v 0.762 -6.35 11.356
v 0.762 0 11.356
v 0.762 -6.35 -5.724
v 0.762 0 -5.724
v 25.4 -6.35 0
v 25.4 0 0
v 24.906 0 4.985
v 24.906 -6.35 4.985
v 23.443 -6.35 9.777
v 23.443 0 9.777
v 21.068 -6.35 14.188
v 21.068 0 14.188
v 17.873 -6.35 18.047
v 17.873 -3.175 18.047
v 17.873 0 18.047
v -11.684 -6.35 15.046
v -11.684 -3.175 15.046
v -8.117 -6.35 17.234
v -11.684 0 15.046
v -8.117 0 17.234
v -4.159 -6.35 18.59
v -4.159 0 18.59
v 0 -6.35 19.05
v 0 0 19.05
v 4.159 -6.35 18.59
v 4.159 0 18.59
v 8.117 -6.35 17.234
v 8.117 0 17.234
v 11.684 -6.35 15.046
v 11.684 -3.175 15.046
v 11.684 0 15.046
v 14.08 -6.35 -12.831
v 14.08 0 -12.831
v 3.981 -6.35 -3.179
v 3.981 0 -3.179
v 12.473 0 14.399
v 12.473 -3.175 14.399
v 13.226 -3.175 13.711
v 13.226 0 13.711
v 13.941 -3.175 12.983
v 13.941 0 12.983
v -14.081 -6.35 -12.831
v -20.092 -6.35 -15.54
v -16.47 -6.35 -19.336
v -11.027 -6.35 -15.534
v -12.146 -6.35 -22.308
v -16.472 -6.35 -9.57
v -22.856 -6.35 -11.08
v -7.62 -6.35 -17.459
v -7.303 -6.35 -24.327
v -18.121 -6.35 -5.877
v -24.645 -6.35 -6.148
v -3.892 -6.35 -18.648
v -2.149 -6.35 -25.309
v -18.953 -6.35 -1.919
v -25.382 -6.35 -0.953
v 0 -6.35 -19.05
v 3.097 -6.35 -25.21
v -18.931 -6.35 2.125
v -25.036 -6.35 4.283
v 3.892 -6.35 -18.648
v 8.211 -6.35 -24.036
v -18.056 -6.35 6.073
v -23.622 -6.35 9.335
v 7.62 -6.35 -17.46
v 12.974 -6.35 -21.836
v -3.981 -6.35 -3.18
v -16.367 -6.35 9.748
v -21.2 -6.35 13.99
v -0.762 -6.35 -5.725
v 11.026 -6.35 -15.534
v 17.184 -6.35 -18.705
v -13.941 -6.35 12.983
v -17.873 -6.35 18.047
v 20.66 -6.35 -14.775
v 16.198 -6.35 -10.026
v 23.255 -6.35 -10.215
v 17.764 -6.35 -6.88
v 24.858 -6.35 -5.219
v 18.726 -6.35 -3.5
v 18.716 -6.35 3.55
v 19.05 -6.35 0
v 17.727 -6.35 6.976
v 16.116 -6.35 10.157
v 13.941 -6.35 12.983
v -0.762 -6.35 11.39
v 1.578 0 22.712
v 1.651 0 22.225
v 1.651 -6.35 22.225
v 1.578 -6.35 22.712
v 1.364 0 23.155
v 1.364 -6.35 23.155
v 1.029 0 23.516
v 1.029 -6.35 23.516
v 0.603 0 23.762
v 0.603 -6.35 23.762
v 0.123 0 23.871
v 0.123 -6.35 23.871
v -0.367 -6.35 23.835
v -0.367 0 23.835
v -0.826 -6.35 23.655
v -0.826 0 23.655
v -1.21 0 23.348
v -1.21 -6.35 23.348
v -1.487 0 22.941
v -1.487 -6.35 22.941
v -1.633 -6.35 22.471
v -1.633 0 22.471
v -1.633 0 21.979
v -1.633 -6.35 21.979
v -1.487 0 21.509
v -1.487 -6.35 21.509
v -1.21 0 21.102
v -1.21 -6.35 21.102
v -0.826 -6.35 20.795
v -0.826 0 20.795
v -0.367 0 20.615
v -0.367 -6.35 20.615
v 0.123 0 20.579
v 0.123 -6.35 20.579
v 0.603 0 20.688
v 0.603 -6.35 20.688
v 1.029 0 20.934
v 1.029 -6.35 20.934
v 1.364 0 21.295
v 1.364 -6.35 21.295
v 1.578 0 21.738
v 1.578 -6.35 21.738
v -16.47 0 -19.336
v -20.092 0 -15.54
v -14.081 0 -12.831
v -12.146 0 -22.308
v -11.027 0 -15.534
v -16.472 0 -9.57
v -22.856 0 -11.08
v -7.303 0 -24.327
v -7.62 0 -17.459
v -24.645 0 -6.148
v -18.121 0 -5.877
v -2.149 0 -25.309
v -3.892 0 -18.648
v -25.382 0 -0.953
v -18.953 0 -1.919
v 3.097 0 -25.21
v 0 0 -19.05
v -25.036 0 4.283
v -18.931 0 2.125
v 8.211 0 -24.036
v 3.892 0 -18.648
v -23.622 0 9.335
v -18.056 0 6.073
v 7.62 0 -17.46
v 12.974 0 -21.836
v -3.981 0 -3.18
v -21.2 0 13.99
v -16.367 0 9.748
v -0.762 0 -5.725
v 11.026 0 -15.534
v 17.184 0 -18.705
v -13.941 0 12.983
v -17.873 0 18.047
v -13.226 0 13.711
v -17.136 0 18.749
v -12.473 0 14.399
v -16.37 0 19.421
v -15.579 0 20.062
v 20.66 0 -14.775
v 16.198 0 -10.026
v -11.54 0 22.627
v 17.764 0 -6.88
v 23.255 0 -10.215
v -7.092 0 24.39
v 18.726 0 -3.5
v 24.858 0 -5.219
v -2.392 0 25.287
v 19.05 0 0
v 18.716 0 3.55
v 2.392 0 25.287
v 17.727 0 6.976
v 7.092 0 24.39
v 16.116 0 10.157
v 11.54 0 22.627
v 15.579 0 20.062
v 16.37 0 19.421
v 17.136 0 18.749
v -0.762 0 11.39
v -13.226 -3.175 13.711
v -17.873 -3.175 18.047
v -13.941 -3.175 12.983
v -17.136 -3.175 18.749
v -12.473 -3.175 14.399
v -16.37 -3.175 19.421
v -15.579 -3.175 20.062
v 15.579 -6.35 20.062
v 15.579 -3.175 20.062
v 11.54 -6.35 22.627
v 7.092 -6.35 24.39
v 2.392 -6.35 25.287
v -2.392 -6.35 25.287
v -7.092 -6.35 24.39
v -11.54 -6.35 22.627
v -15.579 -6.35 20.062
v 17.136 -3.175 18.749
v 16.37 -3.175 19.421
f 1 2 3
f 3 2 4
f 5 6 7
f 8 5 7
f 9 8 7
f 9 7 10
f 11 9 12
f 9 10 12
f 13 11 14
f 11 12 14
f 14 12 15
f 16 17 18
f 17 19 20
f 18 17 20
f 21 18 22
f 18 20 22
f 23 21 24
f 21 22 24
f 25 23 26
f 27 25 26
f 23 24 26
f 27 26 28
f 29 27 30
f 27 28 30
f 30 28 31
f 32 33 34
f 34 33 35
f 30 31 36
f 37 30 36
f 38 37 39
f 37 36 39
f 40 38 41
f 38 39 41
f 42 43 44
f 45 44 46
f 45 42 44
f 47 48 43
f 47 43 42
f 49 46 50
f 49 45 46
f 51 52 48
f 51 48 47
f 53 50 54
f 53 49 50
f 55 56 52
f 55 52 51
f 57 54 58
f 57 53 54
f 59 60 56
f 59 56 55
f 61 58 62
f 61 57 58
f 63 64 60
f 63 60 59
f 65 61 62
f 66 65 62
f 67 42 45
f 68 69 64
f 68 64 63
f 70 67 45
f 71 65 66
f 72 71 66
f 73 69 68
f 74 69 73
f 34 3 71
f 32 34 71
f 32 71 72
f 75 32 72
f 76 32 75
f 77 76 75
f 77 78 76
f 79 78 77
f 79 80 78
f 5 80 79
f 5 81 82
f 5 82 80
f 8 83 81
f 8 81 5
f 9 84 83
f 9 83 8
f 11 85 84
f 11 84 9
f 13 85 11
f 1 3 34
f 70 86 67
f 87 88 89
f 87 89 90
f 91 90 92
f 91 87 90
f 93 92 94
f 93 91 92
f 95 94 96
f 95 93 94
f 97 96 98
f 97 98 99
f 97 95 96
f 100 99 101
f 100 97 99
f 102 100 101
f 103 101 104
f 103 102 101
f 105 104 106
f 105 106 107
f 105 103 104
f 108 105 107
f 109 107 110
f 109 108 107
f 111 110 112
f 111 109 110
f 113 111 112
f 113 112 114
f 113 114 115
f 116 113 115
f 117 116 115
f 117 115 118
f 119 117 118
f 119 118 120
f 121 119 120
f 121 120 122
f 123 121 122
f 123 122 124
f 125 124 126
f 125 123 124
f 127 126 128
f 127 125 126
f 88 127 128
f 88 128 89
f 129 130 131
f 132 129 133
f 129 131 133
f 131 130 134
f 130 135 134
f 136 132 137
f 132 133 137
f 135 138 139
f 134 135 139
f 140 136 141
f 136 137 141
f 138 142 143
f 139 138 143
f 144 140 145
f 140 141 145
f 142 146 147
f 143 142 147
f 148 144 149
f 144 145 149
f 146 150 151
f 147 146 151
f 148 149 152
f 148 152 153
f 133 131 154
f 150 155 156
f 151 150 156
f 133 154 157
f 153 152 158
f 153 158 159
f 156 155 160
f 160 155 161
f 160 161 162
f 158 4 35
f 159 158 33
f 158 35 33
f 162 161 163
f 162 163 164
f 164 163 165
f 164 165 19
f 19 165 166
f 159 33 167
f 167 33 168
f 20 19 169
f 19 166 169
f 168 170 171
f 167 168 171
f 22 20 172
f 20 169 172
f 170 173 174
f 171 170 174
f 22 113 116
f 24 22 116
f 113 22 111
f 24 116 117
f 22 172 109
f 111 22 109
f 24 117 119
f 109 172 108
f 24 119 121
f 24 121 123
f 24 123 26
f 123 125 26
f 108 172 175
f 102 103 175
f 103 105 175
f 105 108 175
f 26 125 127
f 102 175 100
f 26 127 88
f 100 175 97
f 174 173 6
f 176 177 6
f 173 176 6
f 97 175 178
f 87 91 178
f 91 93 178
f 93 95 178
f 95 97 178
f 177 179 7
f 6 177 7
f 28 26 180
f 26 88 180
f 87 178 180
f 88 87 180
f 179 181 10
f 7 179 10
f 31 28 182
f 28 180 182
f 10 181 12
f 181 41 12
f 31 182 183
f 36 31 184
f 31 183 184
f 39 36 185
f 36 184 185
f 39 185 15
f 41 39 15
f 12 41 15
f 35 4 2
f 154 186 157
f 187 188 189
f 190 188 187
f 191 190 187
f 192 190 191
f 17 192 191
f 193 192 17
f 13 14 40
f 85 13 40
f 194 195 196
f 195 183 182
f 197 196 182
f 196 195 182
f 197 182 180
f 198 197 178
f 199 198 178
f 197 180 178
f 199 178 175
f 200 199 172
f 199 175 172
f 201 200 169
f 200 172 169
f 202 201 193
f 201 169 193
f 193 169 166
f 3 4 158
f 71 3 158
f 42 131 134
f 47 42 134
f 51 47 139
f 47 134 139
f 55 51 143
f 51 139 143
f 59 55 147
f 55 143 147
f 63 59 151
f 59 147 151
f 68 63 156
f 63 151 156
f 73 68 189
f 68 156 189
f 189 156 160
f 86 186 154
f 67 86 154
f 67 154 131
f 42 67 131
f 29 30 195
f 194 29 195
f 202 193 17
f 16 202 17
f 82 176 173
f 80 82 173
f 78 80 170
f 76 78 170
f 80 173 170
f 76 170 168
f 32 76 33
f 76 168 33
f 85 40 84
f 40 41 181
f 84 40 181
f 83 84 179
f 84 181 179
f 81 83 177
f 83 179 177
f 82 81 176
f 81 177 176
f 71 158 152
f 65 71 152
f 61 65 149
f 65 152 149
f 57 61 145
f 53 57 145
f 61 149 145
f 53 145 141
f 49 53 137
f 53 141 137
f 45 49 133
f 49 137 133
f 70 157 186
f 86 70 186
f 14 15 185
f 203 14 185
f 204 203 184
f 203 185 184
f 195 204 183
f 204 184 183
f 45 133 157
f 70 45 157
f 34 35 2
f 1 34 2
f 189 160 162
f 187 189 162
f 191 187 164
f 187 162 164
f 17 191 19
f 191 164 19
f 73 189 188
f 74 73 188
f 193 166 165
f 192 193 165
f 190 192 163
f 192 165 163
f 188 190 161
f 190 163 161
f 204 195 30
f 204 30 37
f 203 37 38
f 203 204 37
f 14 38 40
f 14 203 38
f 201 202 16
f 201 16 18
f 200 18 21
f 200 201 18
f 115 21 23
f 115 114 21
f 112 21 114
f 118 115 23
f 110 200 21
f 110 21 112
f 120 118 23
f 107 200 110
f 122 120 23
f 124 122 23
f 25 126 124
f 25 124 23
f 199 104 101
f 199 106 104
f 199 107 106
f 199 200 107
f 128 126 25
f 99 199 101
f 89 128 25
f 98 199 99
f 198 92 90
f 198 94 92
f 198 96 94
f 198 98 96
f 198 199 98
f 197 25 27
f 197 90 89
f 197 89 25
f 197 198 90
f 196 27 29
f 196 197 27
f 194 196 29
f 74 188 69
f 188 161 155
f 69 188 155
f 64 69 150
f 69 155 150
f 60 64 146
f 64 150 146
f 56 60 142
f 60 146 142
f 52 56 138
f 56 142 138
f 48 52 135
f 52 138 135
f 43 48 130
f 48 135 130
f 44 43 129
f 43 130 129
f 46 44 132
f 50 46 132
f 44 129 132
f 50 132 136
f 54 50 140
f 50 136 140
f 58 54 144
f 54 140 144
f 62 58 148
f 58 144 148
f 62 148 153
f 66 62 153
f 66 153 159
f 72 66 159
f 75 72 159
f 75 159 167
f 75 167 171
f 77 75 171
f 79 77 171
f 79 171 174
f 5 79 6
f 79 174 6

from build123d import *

# Parameters (mm, degrees)
F1_DEPTH = 6.35
F0_R     = 1.651
F2_DEPTH = 3.175


with BuildPart() as f1:
    # F0 (on Front) → F1 (new body)
    with BuildSketch(Plane.XZ):
        with BuildLine():
            ThreePointArc((11.0264984463, -15.5344401899), (12.6259487856, -14.2649191117), (14.0803208699, -12.831487217))
            Line((14.0803208699, -12.831487217), (3.9810826848, -3.1792186712))
            Line((3.9810826848, -3.1792186712), (0.762, 11.3559151068))
            Line((0.762, 11.3559151068), (0.762, -5.7242254315))
            Line((0.762, -5.7242254315), (11.0264984463, -15.5344401899))
        make_face()
        with BuildLine():
            Line((-3.9805361158, -3.1797711993), (-14.0807017487, -12.8310692565))
            ThreePointArc((-14.0807017487, -12.8310692565), (-12.6263635982, -14.2645519483), (-11.0269407935, -15.5341261981))
            Line((-11.0269407935, -15.5341261981), (-0.762, -5.725375853))
            Line((-0.762, -5.725375853), (-0.762, 11.3895507529))
            Line((-0.762, 11.3895507529), (-3.9805361158, -3.1797711993))
        make_face()
        with BuildLine():
            ThreePointArc((-17.8734776092, 18.047127144), (-9.7768519659, -23.4429768937), (25.4, 0))
            ThreePointArc((25.4, 0), (23.4429768937, 9.7768519659), (17.8734776092, 18.047127144))
            Line((17.8734776092, 18.047127144), (13.9408592709, 12.9828711304))
            ThreePointArc((13.9408592709, 12.9828711304), (17.7267575872, 6.9759992434), (19.05, 0))
            ThreePointArc((19.05, 0), (17.7641860575, -6.8801303559), (14.0803208699, -12.831487217))
            ThreePointArc((14.0803208699, -12.831487217), (12.6259487856, -14.2649191117), (11.0264984463, -15.5344401899))
            ThreePointArc((11.0264984463, -15.5344401899), (-0.0002712295, -19.0499999981), (-11.0269407935, -15.5341261981))
            ThreePointArc((-11.0269407935, -15.5341261981), (-12.6263635982, -14.2645519483), (-14.0807017487, -12.8310692565))
            ThreePointArc((-14.0807017487, -12.8310692565), (-19.0497204722, 0.1031985072), (-13.9408592709, 12.9828711304))
            Line((-13.9408592709, 12.9828711304), (-17.8734776092, 18.047127144))
        make_face()
    extrude(amount=F1_DEPTH)



with BuildPart() as f1b:
    # F0 (on Front) → F1, piece 2 (new body)
    with BuildSketch(Plane.XZ):
        with BuildLine():
            Line((11.684, 15.0461504711), (15.5786666667, 20.0615339615))
            ThreePointArc((15.5786666667, 20.0615339615), (0, 25.4), (-15.5786666667, 20.0615339615))
            Line((-15.5786666667, 20.0615339615), (-11.684, 15.0461504711))
            ThreePointArc((-11.684, 15.0461504711), (0, 19.05), (11.684, 15.0461504711))
        make_face()
        with Locations((0, 22.225)):
            Circle(F0_R, mode=Mode.SUBTRACT)
    extrude(amount=F1_DEPTH)


with BuildPart() as f1_1:
    add(f1.part)

    add(f1b.part)  # F2 merges F1b
    # F0 (on Front) → F2 (join)
    with BuildSketch(Plane.XZ):
        with BuildLine():
            ThreePointArc((-15.5786666667, 20.0615339615), (-16.7563703668, 19.0888462755), (-17.8734776092, 18.047127144))
            Line((-17.8734776092, 18.047127144), (-13.9408592709, 12.9828711304))
            ThreePointArc((-13.9408592709, 12.9828711304), (-12.8538956575, 14.0598672265), (-11.684, 15.0461504711))
            Line((-11.684, 15.0461504711), (-15.5786666667, 20.0615339615))
        make_face()
        with BuildLine():
            Line((13.9408592709, 12.9828711304), (17.8734776092, 18.047127144))
            ThreePointArc((17.8734776092, 18.047127144), (16.7563703668, 19.0888462755), (15.5786666667, 20.0615339615))
            Line((15.5786666667, 20.0615339615), (11.684, 15.0461504711))
            ThreePointArc((11.684, 15.0461504711), (12.8538956575, 14.0598672265), (13.9408592709, 12.9828711304))
        make_face()
    extrude(amount=F2_DEPTH)


solid = f1_1.part
